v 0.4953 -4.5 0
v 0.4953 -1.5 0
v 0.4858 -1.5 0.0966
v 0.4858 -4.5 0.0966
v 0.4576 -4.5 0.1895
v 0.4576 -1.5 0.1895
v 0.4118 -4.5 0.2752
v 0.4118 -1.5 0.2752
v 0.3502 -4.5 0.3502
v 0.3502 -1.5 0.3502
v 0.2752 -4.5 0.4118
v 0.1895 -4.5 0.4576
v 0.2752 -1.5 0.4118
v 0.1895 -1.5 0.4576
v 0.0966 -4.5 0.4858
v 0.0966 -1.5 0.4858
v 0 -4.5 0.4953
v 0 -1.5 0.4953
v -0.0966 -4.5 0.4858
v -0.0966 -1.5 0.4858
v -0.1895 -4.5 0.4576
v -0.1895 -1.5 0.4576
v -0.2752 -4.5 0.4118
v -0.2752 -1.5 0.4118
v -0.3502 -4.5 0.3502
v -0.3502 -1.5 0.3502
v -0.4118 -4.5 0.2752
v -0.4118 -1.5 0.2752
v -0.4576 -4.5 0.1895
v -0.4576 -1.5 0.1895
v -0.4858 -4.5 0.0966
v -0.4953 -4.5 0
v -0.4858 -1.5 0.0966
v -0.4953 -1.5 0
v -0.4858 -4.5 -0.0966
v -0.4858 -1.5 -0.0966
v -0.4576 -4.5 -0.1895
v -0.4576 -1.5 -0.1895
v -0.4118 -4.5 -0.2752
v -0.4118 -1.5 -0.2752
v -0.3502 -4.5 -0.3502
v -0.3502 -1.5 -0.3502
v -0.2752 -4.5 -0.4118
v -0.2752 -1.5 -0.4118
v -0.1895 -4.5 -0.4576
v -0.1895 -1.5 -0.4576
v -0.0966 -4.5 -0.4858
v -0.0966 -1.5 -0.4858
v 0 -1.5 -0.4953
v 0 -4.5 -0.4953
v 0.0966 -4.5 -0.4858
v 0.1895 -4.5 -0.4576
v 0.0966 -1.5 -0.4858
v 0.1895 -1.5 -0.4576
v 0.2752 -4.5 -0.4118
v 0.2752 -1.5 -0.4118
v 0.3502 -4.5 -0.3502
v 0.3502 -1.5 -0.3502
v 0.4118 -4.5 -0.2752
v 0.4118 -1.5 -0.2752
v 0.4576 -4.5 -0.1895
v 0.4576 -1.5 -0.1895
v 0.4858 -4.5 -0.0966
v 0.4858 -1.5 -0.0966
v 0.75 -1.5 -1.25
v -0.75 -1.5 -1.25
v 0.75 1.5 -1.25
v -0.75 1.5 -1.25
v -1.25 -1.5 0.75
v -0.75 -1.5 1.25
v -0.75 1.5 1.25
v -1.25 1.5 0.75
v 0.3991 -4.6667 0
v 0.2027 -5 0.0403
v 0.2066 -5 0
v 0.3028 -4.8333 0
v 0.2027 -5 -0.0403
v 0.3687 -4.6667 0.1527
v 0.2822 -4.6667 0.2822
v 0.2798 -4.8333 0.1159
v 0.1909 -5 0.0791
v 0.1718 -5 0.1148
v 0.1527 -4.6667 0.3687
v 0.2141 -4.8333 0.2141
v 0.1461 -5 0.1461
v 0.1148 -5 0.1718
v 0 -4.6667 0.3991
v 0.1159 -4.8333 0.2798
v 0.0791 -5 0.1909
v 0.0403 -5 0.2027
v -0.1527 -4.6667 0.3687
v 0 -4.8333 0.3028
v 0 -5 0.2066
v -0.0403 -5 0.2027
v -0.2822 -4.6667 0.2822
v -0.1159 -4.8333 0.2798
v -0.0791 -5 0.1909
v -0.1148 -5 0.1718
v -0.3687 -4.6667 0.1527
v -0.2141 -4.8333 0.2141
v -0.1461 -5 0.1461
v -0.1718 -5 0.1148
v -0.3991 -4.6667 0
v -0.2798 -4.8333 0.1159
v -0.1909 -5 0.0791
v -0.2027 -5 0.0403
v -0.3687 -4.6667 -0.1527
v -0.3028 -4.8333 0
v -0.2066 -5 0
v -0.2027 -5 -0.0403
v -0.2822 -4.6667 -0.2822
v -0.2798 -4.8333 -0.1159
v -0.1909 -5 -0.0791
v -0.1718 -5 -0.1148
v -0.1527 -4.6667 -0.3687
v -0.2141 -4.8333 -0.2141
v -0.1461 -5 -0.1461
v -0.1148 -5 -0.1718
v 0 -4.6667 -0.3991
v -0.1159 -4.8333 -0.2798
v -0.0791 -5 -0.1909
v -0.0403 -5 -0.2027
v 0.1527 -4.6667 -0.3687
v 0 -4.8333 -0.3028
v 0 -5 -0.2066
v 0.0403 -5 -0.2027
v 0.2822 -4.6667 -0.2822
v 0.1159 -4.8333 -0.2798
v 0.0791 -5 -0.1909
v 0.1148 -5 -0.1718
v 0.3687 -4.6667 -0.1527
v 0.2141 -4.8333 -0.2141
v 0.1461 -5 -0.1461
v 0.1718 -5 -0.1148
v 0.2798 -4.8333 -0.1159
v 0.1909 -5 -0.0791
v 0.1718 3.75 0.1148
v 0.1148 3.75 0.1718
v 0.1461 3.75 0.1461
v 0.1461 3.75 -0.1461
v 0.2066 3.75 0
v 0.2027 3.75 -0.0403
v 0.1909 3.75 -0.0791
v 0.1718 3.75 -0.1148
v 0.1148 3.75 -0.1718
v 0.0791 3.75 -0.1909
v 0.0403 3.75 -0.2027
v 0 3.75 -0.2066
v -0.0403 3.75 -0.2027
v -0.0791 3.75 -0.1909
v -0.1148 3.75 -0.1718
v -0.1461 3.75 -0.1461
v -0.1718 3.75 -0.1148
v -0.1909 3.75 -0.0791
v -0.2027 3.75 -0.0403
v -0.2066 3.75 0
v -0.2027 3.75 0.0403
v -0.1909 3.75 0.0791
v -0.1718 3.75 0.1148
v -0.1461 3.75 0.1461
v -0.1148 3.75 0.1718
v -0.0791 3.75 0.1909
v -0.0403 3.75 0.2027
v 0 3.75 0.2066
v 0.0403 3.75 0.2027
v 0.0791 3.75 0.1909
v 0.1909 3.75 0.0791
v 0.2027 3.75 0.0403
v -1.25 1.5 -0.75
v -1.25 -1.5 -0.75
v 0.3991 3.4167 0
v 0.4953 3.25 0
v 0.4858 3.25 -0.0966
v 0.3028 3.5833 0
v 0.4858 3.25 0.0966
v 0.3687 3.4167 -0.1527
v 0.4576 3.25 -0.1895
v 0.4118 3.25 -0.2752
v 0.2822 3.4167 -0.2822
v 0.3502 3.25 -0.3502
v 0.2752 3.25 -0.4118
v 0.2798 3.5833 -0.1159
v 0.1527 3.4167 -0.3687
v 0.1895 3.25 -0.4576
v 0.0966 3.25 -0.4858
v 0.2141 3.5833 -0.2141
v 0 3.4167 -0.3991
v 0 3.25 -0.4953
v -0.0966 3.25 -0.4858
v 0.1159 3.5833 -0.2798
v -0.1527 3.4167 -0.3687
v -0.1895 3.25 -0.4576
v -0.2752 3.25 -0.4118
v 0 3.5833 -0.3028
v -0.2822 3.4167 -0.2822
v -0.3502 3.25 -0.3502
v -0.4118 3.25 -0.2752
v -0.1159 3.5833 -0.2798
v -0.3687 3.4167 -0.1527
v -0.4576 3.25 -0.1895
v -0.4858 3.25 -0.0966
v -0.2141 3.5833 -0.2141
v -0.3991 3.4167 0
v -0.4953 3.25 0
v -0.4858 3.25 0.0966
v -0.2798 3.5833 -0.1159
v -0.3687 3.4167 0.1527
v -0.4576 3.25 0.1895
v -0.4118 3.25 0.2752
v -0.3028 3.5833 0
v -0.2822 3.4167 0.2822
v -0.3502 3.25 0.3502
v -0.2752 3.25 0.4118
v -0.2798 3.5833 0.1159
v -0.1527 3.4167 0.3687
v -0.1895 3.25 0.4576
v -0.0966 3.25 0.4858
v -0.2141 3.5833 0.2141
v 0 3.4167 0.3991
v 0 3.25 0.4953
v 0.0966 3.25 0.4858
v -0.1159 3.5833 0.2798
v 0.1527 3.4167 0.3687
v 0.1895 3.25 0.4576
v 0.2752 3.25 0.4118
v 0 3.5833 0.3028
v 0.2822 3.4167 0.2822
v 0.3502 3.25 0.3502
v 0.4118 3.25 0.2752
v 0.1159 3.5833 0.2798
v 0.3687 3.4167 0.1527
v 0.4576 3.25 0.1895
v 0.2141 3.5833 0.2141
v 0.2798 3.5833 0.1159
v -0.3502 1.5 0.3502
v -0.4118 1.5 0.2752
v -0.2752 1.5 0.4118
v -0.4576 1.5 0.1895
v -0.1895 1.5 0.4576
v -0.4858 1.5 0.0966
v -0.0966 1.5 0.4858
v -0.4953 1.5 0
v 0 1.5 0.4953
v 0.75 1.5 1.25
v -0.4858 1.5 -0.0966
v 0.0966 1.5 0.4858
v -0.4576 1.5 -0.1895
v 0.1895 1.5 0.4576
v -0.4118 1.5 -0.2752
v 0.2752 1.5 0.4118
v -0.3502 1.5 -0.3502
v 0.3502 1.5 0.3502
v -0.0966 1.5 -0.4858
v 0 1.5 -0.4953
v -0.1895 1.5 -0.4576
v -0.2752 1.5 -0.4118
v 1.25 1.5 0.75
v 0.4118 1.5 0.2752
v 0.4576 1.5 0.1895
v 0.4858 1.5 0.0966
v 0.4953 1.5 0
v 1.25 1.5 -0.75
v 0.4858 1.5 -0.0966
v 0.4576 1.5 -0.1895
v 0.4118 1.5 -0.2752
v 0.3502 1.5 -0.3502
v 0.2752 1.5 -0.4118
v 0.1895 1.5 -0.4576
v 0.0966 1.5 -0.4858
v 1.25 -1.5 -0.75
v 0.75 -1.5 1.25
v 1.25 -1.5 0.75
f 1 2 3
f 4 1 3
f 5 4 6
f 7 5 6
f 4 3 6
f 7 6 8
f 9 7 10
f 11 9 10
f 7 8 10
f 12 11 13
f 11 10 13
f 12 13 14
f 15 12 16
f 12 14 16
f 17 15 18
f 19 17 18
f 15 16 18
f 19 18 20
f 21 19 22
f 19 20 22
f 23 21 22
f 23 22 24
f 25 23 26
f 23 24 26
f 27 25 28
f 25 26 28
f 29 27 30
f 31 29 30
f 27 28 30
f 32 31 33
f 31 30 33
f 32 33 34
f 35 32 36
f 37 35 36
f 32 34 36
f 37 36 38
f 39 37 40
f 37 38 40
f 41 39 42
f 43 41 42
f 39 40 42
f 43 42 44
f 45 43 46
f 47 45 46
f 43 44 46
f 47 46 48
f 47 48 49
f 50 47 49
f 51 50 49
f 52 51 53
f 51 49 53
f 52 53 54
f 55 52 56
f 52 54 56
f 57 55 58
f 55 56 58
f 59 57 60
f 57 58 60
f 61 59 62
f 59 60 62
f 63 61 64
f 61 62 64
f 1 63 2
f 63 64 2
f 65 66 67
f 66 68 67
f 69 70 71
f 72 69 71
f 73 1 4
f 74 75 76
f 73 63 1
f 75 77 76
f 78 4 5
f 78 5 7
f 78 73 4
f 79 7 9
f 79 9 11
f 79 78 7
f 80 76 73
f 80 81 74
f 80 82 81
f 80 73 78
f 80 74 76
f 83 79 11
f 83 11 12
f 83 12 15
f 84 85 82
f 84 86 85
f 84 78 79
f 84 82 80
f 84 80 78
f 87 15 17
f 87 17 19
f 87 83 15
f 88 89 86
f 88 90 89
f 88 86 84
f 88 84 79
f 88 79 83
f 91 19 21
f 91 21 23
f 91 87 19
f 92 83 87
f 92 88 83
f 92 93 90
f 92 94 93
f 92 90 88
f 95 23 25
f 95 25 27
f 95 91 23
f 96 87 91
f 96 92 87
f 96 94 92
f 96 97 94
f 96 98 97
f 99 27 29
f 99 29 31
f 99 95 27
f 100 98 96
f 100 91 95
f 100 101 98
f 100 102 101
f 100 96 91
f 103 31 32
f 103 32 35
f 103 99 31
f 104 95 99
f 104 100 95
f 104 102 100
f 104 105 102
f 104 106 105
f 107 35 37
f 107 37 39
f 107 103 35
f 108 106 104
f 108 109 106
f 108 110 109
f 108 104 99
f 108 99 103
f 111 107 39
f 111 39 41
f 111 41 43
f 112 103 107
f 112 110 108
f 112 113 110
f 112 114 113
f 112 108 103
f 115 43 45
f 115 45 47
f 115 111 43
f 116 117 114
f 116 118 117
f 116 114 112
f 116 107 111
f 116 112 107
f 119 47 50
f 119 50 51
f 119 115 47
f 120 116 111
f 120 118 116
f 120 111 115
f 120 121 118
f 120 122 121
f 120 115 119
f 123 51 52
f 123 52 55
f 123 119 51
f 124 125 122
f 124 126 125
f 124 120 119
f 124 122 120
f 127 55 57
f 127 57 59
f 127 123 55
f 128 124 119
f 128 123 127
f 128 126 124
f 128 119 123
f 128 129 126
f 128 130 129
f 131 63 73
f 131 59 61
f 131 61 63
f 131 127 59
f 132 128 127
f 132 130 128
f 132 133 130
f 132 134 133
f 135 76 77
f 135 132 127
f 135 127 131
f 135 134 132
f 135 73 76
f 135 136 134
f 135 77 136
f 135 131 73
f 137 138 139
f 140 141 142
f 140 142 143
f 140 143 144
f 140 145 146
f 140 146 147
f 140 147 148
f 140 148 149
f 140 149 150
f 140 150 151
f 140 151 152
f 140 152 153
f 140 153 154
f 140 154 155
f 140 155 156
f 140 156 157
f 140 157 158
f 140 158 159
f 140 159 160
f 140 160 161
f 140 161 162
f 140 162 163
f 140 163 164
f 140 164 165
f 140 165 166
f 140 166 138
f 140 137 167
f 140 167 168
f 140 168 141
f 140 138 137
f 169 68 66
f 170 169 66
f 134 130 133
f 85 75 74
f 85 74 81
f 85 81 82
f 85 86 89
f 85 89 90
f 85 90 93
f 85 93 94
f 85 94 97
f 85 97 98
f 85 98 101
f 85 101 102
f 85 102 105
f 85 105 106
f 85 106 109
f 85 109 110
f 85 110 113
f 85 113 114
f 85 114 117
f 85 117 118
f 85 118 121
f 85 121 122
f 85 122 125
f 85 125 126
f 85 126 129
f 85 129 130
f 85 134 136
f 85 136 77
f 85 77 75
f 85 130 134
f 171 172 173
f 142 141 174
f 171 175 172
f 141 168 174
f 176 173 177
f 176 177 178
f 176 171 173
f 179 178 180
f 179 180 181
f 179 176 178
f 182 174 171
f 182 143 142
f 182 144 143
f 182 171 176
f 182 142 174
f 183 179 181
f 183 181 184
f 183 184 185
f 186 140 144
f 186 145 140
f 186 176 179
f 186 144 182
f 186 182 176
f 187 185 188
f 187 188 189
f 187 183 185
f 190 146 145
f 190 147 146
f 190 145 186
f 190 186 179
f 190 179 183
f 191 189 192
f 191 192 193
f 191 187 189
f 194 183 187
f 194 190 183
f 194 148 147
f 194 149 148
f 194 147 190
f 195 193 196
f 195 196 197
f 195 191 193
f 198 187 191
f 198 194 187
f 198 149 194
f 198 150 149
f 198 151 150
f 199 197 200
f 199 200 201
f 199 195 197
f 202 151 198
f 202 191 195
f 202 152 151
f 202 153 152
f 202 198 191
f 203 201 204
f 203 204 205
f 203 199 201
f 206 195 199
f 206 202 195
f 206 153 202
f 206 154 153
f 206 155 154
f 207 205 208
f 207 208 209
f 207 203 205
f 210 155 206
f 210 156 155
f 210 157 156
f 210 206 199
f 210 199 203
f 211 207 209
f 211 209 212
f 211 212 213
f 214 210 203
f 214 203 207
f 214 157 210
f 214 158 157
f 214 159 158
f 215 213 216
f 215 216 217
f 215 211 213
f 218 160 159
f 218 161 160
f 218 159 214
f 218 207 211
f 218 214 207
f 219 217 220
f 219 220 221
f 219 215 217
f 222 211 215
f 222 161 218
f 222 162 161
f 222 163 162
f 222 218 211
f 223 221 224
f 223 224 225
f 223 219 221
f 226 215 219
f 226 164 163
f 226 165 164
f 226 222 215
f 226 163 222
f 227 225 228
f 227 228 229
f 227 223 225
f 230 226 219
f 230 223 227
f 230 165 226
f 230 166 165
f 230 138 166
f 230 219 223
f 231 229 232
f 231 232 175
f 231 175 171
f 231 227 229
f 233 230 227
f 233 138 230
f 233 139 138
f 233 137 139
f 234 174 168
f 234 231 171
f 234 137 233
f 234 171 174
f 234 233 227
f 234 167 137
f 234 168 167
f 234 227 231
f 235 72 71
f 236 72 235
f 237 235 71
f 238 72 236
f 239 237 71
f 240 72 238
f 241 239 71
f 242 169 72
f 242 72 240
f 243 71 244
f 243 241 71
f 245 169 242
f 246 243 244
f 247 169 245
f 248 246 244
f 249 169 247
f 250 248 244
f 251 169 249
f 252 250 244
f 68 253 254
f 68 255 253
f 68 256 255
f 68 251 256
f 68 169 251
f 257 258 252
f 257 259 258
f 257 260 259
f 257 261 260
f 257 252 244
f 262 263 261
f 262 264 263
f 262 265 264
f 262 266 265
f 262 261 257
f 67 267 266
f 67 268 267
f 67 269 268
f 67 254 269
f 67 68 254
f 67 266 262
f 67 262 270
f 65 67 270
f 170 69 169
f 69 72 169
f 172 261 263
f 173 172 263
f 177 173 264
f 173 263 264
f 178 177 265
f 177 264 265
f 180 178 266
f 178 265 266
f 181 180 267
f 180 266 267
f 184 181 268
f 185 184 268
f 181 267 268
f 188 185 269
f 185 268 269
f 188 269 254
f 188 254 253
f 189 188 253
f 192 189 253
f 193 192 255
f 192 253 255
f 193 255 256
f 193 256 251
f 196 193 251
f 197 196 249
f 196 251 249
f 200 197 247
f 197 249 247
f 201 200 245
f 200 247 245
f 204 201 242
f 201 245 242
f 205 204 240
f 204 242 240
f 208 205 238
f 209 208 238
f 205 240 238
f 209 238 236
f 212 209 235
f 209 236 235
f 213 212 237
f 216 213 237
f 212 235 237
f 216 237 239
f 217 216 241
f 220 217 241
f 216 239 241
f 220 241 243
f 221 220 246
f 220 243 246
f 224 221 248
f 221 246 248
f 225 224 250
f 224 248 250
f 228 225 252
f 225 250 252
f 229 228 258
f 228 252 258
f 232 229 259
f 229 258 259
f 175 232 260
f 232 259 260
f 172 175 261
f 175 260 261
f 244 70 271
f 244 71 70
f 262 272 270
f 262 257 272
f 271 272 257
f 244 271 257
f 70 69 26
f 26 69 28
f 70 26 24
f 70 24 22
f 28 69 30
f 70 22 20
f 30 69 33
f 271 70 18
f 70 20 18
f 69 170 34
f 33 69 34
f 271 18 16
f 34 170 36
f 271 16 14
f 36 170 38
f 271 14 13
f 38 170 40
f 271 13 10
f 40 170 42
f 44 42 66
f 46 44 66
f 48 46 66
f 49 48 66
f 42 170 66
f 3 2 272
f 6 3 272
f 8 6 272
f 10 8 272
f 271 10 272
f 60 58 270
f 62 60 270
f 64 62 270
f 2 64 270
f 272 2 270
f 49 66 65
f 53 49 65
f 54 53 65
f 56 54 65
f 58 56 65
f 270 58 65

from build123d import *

# Parameters (mm, degrees)
SKETCH1_W           = 2.5
SKETCH1_H           = 2.5
BOSS_EXTRUDE1_DEPTH = 1.5
SKETCH2_R           = 0.4953
BOSS_EXTRUDE2_DEPTH = 2.25
CHAMFER1_SIZE       = 0.5
CHAMFER1_SIZE2      = 0.288675135
CHAMFER2_SIZE       = 0.5
SKETCH4_R           = 0.4953
BOSS_EXTRUDE3_DEPTH = 3.5
CHAMFER3_SIZE       = 0.5
CHAMFER3_SIZE2      = 0.288675135


with BuildPart() as part:
    # Sketch1 → Boss-Extrude1 (new body, symmetric)
    with BuildSketch(Plane(origin=(0, 0, 0), x_dir=(1, 0, 0), z_dir=(0, 1, 0))):
        Rectangle(SKETCH1_W, SKETCH1_H)
    extrude(amount=BOSS_EXTRUDE1_DEPTH, both=True)

    # Sketch2 → Boss-Extrude2 (add)
    with BuildSketch(Plane(origin=(0, 1.5, 0), x_dir=(1, 0, 0), z_dir=(0, 1, 0))):
        Circle(SKETCH2_R)
    extrude(amount=BOSS_EXTRUDE2_DEPTH)

    # Chamfer1
    chamfer1_edges = [part.edges().sort_by_distance(p)[0] for p in [
        (-0.4953, 3.75, 0),
    ]]
    chamfer1_side = [part.faces().sort_by_distance(p)[0] for p in [
        (-0.4953, 2.625, 0),
    ]]
    chamfer(chamfer1_edges, length=CHAMFER1_SIZE, length2=CHAMFER1_SIZE2, reference=chamfer1_side[0])

    # Chamfer2
    chamfer2_edges = [part.edges().sort_by_distance(p)[0] for p in [
        (-1.25, 0, 1.25),
        (-1.25, 0, -1.25),
        (1.25, 0, -1.25),
        (1.25, 0, 1.25),
    ]]
    chamfer(chamfer2_edges, length=CHAMFER2_SIZE)

    # Sketch4 → Boss-Extrude3 (add)
    with BuildSketch(Plane.XZ.offset(1.5)):
        Circle(SKETCH4_R)
    extrude(amount=BOSS_EXTRUDE3_DEPTH)

    # Chamfer3
    chamfer3_edges = [part.edges().sort_by_distance(p)[0] for p in [
        (-0.4953, -5, 0),
    ]]
    chamfer3_side = [part.faces().sort_by_distance(p)[0] for p in [
        (-0.4953, -3.25, 0),
    ]]
    chamfer(chamfer3_edges, length=CHAMFER3_SIZE, length2=CHAMFER3_SIZE2, reference=chamfer3_side[0])


solid = part.part
